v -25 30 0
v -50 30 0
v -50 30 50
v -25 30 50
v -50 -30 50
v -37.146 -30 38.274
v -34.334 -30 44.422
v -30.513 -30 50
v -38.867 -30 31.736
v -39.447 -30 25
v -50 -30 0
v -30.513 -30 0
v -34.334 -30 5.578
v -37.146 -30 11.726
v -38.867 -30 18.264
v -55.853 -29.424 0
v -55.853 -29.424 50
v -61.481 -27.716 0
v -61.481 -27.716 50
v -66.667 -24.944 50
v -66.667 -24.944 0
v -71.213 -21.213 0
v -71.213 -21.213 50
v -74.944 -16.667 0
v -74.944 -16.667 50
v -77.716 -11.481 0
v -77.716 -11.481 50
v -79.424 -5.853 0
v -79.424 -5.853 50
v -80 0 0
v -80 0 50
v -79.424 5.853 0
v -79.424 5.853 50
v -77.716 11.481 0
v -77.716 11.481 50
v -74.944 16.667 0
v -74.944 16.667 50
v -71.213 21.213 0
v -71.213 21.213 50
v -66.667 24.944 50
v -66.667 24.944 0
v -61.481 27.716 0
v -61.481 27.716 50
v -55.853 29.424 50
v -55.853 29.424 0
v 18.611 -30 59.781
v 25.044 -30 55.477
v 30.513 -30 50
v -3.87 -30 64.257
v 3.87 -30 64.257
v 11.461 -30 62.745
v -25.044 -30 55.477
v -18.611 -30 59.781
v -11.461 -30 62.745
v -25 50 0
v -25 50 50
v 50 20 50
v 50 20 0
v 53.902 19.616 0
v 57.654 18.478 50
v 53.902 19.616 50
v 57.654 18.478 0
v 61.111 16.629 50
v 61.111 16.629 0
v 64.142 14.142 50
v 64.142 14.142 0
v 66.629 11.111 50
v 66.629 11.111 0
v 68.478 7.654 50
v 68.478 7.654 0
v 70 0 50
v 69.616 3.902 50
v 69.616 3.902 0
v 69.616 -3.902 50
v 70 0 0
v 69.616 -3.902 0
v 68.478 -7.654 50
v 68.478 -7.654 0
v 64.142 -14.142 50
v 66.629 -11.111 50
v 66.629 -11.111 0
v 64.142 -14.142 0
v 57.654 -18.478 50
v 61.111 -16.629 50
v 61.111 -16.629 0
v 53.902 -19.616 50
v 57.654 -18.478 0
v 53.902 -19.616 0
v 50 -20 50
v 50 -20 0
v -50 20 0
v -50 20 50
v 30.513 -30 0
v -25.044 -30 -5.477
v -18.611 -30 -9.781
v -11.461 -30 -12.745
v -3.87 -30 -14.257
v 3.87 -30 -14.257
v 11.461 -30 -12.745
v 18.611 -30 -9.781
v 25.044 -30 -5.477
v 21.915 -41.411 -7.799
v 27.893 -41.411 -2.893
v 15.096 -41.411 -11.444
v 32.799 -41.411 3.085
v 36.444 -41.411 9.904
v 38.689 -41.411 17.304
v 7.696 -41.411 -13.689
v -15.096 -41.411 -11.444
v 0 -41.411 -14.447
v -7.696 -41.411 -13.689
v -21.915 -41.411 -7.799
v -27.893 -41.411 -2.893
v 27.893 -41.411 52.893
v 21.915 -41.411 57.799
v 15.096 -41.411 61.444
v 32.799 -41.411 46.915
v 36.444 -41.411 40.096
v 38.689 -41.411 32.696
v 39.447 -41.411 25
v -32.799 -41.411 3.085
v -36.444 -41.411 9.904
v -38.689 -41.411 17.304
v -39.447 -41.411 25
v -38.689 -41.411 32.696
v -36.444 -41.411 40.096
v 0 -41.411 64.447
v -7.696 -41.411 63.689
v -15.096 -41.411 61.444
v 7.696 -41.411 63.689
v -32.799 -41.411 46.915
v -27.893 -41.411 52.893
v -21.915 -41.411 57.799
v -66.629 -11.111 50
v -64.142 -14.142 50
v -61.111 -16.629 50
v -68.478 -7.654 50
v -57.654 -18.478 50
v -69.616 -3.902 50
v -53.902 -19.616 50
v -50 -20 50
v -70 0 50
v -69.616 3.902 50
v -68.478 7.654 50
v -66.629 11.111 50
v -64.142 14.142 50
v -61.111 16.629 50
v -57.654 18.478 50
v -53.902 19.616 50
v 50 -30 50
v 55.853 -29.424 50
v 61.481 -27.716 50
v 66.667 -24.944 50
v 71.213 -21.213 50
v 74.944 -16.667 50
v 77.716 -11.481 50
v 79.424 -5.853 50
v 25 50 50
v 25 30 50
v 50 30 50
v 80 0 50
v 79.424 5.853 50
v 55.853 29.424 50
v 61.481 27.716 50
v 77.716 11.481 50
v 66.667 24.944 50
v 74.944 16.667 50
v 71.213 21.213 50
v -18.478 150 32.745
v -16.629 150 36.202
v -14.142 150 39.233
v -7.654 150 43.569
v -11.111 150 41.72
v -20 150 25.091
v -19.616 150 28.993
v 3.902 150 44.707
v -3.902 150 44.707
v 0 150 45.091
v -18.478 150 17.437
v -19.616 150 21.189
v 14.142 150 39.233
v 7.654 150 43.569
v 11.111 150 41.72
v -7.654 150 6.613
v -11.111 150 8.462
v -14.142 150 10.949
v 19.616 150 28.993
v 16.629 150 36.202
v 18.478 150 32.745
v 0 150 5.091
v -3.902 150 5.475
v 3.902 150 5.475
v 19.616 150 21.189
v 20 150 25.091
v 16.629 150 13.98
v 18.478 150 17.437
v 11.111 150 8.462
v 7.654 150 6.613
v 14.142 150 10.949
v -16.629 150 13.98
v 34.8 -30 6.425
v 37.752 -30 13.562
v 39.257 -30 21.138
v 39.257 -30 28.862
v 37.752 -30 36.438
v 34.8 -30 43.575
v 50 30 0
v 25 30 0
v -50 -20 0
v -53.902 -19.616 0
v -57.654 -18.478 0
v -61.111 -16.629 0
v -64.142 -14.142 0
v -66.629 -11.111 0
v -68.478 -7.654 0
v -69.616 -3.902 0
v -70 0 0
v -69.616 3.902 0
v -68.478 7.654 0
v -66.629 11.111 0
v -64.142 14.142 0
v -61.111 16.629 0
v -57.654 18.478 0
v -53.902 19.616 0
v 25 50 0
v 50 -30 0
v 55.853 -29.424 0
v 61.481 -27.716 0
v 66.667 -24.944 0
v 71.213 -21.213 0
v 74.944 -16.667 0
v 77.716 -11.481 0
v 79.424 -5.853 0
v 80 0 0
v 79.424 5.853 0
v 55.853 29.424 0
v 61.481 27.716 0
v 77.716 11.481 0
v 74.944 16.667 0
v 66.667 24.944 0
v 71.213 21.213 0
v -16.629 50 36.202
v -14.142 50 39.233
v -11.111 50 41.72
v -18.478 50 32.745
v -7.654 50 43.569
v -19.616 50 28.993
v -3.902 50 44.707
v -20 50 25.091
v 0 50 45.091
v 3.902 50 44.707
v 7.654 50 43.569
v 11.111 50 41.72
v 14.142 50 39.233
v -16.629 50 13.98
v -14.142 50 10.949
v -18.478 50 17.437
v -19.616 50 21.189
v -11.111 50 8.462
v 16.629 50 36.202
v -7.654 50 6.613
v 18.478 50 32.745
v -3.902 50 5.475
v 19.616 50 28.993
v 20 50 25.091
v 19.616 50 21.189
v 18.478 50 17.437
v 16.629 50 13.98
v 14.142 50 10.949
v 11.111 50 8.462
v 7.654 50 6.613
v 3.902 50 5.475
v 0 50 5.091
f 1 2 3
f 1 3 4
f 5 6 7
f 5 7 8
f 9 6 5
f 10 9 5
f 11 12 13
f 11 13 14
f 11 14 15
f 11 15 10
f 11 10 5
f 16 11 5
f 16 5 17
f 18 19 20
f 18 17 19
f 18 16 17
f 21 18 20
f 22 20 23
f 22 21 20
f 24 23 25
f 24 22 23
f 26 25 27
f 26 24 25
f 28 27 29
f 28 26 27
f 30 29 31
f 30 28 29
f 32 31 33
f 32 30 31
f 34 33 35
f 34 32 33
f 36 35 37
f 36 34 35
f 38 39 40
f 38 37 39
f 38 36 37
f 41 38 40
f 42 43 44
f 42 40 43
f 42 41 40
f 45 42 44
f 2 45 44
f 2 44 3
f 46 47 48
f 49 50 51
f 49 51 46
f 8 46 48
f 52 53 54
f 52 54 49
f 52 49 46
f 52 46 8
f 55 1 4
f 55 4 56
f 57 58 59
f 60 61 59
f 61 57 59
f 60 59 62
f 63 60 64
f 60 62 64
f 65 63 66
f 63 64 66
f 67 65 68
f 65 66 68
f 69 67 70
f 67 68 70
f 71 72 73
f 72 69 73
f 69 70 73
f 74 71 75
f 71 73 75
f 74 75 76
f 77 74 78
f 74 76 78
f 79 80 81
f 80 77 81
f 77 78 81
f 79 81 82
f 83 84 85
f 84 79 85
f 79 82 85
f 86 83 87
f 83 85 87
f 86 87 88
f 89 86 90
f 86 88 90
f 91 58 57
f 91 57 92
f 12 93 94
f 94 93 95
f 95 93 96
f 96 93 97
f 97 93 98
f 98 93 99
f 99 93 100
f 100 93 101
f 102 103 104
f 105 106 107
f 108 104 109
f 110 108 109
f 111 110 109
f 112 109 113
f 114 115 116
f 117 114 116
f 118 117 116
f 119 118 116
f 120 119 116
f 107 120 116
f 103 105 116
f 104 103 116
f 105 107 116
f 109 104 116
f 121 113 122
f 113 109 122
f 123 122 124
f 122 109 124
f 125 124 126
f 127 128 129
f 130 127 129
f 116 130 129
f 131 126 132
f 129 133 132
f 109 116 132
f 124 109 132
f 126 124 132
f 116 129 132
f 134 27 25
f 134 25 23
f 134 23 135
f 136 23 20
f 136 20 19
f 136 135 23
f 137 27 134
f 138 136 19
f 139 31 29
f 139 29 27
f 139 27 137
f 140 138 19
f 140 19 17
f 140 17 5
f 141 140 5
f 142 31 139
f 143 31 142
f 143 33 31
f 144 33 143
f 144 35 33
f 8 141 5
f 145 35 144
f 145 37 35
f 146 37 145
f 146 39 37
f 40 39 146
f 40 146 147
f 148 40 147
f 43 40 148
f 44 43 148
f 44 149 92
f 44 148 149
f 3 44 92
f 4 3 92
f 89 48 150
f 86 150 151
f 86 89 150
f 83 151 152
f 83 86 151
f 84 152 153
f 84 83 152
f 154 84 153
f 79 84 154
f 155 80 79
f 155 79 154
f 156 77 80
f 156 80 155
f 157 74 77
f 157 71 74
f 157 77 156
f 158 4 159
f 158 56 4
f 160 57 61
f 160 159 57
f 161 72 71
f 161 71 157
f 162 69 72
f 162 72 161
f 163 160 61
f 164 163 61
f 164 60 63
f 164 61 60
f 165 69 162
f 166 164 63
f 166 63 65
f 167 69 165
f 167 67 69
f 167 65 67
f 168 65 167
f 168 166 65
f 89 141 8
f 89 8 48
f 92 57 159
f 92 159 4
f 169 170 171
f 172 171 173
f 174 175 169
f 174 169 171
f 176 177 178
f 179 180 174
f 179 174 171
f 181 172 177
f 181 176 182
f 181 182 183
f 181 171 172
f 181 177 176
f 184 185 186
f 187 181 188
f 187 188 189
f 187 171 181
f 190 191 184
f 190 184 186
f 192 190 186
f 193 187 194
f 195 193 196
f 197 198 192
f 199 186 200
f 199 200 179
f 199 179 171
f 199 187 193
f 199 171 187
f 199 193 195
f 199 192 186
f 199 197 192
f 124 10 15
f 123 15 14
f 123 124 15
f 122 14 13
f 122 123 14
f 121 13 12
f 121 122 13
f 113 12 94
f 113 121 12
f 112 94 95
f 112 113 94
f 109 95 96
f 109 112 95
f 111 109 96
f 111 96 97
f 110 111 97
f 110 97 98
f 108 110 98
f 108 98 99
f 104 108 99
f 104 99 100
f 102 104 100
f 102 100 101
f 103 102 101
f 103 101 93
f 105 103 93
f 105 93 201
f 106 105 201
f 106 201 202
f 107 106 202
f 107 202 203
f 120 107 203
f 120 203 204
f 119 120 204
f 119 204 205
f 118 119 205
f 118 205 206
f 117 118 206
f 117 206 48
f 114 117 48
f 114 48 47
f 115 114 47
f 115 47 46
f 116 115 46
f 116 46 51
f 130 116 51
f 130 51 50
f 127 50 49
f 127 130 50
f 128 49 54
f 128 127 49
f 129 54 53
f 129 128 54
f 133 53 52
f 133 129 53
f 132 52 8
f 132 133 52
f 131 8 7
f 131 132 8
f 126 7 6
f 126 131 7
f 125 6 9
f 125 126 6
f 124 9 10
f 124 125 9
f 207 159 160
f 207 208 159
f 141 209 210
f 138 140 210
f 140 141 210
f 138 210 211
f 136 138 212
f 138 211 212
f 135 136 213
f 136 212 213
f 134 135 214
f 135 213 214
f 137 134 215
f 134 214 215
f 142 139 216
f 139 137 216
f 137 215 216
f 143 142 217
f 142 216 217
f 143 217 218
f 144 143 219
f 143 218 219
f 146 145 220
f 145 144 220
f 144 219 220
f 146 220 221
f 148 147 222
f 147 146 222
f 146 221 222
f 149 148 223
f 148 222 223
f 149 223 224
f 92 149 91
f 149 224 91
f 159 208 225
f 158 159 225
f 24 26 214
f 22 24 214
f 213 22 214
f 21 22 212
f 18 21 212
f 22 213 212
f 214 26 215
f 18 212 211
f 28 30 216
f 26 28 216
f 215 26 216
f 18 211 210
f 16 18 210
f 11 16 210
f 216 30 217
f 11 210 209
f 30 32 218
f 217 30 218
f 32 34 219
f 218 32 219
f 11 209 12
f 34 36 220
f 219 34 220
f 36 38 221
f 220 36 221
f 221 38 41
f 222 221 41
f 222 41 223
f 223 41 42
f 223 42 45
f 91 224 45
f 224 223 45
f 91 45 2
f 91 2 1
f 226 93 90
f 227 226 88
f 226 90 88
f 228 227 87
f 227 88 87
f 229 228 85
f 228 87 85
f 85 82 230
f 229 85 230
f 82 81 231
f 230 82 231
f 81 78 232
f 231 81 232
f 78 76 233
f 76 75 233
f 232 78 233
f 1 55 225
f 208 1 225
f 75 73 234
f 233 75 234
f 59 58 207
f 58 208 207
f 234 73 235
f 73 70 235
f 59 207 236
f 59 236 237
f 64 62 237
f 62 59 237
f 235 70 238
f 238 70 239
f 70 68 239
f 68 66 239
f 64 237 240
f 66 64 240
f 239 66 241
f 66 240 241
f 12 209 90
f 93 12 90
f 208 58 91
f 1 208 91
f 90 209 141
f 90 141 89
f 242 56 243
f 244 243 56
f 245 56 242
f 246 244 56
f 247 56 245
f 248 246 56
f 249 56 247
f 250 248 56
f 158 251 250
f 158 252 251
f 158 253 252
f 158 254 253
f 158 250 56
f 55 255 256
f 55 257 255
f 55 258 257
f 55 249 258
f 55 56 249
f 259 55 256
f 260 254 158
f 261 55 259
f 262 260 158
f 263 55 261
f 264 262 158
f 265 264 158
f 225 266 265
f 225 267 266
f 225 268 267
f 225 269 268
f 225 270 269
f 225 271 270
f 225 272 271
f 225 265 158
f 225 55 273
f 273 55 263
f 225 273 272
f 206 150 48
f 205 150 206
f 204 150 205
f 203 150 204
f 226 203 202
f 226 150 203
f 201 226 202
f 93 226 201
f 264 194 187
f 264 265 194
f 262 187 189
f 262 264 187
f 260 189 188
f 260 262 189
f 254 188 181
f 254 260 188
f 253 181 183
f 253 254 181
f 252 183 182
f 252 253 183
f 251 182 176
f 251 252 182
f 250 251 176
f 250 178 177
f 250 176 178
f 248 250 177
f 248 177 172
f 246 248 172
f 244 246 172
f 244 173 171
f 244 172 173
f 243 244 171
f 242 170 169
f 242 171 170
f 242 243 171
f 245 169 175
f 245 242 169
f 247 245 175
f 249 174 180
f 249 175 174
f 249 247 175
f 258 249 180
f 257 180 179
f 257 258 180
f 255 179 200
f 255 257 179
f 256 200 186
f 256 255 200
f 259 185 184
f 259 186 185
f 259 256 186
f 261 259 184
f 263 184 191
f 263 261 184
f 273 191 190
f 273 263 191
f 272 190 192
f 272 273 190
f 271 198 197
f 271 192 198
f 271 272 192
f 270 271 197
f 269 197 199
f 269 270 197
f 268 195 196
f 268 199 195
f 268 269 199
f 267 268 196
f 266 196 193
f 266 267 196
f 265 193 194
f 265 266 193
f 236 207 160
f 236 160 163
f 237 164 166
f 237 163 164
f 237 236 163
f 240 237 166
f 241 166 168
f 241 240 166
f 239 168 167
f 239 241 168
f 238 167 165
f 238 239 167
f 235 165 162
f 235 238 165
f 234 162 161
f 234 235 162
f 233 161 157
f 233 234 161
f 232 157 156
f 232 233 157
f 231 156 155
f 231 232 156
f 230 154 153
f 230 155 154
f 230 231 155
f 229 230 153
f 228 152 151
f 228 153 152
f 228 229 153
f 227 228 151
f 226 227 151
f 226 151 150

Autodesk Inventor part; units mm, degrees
ref_plane "YZ Plane" through (0, 0, 0) normal (1, 0, 0) x (0, 1, 0)
ref_plane "XZ Plane" through (0, 0, 0) normal (0, 1, 0) x (-1, 0, 0)
ref_plane "XY Plane" through (0, 0, 0) normal (0, 0, 1) x (1, 0, 0)
sketch "스케치1" plane through (0, 0, 0) normal (0, 0, 1) x (1, 0, 0)
  line L0 (-50, -20) -> (50, -20)
  line L1 (50, 20) -> (-50, 20)
  line L2 (-50, -20) -> (50, 20) construction
  line L3 (50, -20) -> (-50, 20) construction
  arc A0 (-50, 20) -> (-50, -20) centre (-50, 0) ccw
  arc A1 (50, -20) -> (50, 20) centre (50, 0) ccw
  arc A2 (50, -30) -> (50, 30) centre (50, 0) ccw
  line L4 (50, -30) -> (-50, -30)
  arc A3 (-50, 30) -> (-50, -30) centre (-50, 0) ccw
  line L5 (25, 30) -> (25, 50)
  line L6 (-25, 30) -> (-25, 50)
  line L7 (-50, 30) -> (-25, 30)
  line L8 (25, 30) -> (50, 30)
  line L9 (-25, 50) -> (25, 50)
  point P0 (0, 0)
  point P1 (0, 0)
  dimension "d13" = 20
  dimension "d14" = 10
extrude "돌출1" add sketch "스케치1" along normal blind 50
sketch "스케치2" plane through (-25, 50, 0) normal (0, 1, 0) x (1, 0, 0)
  point P0 (25, 0)
ref_plane "작업 평면1" through (0, 0, 25) normal (0, 0, -1) x (-1, 0, 0)
sketch "스케치3" plane through (-25, 50, 0) normal (0, 1, 0) x (1, 0, 0)
  circle A0 centre (25, -25.091) radius 20
  point P0 (25, 0)
  dimension "d17" = 40
extrude "돌출2" add sketch "스케치3" along normal blind 100
sketch "스케치4" plane through (0, 0, 25) normal (0, 0, -1) x (-1, 0, 0)
  line L0 (50, -30) -> (-50, -30) projected
  line L1 (0, -30) -> (39.4468, -30)
  line L2 (39.4468, -30) -> (39.4468, -41.4109)
  line L3 (39.4468, -41.4109) -> (0, -41.4109)
  line L4 (0, -41.4109) -> (0, -30)
  point P0 (0, 0)
revolve "회전1" add sketch "스케치4" angle 360 about axis through (0, -41.4109, 25) along (0, 1, 0)
properties part number "부품1" material "은"
